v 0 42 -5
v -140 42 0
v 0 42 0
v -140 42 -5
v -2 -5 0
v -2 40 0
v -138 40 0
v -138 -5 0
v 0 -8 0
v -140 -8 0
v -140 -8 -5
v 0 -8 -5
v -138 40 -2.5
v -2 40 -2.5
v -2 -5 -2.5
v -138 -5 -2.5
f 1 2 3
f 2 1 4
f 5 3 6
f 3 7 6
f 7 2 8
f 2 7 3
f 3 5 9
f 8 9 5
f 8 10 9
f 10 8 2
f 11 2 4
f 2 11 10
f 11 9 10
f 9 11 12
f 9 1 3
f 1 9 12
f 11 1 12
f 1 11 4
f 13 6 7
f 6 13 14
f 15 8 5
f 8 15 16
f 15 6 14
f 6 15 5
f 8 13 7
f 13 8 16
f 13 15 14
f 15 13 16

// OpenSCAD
difference() {

    difference() {
     
        
        rotate([0,90,90])
        translate([0,0,-8])
            cube([5,140,50]);
        
        rotate([0,90,90])
        translate([0,2,-5])
            cube([2.5,136,45]);
        
            
    }
}
